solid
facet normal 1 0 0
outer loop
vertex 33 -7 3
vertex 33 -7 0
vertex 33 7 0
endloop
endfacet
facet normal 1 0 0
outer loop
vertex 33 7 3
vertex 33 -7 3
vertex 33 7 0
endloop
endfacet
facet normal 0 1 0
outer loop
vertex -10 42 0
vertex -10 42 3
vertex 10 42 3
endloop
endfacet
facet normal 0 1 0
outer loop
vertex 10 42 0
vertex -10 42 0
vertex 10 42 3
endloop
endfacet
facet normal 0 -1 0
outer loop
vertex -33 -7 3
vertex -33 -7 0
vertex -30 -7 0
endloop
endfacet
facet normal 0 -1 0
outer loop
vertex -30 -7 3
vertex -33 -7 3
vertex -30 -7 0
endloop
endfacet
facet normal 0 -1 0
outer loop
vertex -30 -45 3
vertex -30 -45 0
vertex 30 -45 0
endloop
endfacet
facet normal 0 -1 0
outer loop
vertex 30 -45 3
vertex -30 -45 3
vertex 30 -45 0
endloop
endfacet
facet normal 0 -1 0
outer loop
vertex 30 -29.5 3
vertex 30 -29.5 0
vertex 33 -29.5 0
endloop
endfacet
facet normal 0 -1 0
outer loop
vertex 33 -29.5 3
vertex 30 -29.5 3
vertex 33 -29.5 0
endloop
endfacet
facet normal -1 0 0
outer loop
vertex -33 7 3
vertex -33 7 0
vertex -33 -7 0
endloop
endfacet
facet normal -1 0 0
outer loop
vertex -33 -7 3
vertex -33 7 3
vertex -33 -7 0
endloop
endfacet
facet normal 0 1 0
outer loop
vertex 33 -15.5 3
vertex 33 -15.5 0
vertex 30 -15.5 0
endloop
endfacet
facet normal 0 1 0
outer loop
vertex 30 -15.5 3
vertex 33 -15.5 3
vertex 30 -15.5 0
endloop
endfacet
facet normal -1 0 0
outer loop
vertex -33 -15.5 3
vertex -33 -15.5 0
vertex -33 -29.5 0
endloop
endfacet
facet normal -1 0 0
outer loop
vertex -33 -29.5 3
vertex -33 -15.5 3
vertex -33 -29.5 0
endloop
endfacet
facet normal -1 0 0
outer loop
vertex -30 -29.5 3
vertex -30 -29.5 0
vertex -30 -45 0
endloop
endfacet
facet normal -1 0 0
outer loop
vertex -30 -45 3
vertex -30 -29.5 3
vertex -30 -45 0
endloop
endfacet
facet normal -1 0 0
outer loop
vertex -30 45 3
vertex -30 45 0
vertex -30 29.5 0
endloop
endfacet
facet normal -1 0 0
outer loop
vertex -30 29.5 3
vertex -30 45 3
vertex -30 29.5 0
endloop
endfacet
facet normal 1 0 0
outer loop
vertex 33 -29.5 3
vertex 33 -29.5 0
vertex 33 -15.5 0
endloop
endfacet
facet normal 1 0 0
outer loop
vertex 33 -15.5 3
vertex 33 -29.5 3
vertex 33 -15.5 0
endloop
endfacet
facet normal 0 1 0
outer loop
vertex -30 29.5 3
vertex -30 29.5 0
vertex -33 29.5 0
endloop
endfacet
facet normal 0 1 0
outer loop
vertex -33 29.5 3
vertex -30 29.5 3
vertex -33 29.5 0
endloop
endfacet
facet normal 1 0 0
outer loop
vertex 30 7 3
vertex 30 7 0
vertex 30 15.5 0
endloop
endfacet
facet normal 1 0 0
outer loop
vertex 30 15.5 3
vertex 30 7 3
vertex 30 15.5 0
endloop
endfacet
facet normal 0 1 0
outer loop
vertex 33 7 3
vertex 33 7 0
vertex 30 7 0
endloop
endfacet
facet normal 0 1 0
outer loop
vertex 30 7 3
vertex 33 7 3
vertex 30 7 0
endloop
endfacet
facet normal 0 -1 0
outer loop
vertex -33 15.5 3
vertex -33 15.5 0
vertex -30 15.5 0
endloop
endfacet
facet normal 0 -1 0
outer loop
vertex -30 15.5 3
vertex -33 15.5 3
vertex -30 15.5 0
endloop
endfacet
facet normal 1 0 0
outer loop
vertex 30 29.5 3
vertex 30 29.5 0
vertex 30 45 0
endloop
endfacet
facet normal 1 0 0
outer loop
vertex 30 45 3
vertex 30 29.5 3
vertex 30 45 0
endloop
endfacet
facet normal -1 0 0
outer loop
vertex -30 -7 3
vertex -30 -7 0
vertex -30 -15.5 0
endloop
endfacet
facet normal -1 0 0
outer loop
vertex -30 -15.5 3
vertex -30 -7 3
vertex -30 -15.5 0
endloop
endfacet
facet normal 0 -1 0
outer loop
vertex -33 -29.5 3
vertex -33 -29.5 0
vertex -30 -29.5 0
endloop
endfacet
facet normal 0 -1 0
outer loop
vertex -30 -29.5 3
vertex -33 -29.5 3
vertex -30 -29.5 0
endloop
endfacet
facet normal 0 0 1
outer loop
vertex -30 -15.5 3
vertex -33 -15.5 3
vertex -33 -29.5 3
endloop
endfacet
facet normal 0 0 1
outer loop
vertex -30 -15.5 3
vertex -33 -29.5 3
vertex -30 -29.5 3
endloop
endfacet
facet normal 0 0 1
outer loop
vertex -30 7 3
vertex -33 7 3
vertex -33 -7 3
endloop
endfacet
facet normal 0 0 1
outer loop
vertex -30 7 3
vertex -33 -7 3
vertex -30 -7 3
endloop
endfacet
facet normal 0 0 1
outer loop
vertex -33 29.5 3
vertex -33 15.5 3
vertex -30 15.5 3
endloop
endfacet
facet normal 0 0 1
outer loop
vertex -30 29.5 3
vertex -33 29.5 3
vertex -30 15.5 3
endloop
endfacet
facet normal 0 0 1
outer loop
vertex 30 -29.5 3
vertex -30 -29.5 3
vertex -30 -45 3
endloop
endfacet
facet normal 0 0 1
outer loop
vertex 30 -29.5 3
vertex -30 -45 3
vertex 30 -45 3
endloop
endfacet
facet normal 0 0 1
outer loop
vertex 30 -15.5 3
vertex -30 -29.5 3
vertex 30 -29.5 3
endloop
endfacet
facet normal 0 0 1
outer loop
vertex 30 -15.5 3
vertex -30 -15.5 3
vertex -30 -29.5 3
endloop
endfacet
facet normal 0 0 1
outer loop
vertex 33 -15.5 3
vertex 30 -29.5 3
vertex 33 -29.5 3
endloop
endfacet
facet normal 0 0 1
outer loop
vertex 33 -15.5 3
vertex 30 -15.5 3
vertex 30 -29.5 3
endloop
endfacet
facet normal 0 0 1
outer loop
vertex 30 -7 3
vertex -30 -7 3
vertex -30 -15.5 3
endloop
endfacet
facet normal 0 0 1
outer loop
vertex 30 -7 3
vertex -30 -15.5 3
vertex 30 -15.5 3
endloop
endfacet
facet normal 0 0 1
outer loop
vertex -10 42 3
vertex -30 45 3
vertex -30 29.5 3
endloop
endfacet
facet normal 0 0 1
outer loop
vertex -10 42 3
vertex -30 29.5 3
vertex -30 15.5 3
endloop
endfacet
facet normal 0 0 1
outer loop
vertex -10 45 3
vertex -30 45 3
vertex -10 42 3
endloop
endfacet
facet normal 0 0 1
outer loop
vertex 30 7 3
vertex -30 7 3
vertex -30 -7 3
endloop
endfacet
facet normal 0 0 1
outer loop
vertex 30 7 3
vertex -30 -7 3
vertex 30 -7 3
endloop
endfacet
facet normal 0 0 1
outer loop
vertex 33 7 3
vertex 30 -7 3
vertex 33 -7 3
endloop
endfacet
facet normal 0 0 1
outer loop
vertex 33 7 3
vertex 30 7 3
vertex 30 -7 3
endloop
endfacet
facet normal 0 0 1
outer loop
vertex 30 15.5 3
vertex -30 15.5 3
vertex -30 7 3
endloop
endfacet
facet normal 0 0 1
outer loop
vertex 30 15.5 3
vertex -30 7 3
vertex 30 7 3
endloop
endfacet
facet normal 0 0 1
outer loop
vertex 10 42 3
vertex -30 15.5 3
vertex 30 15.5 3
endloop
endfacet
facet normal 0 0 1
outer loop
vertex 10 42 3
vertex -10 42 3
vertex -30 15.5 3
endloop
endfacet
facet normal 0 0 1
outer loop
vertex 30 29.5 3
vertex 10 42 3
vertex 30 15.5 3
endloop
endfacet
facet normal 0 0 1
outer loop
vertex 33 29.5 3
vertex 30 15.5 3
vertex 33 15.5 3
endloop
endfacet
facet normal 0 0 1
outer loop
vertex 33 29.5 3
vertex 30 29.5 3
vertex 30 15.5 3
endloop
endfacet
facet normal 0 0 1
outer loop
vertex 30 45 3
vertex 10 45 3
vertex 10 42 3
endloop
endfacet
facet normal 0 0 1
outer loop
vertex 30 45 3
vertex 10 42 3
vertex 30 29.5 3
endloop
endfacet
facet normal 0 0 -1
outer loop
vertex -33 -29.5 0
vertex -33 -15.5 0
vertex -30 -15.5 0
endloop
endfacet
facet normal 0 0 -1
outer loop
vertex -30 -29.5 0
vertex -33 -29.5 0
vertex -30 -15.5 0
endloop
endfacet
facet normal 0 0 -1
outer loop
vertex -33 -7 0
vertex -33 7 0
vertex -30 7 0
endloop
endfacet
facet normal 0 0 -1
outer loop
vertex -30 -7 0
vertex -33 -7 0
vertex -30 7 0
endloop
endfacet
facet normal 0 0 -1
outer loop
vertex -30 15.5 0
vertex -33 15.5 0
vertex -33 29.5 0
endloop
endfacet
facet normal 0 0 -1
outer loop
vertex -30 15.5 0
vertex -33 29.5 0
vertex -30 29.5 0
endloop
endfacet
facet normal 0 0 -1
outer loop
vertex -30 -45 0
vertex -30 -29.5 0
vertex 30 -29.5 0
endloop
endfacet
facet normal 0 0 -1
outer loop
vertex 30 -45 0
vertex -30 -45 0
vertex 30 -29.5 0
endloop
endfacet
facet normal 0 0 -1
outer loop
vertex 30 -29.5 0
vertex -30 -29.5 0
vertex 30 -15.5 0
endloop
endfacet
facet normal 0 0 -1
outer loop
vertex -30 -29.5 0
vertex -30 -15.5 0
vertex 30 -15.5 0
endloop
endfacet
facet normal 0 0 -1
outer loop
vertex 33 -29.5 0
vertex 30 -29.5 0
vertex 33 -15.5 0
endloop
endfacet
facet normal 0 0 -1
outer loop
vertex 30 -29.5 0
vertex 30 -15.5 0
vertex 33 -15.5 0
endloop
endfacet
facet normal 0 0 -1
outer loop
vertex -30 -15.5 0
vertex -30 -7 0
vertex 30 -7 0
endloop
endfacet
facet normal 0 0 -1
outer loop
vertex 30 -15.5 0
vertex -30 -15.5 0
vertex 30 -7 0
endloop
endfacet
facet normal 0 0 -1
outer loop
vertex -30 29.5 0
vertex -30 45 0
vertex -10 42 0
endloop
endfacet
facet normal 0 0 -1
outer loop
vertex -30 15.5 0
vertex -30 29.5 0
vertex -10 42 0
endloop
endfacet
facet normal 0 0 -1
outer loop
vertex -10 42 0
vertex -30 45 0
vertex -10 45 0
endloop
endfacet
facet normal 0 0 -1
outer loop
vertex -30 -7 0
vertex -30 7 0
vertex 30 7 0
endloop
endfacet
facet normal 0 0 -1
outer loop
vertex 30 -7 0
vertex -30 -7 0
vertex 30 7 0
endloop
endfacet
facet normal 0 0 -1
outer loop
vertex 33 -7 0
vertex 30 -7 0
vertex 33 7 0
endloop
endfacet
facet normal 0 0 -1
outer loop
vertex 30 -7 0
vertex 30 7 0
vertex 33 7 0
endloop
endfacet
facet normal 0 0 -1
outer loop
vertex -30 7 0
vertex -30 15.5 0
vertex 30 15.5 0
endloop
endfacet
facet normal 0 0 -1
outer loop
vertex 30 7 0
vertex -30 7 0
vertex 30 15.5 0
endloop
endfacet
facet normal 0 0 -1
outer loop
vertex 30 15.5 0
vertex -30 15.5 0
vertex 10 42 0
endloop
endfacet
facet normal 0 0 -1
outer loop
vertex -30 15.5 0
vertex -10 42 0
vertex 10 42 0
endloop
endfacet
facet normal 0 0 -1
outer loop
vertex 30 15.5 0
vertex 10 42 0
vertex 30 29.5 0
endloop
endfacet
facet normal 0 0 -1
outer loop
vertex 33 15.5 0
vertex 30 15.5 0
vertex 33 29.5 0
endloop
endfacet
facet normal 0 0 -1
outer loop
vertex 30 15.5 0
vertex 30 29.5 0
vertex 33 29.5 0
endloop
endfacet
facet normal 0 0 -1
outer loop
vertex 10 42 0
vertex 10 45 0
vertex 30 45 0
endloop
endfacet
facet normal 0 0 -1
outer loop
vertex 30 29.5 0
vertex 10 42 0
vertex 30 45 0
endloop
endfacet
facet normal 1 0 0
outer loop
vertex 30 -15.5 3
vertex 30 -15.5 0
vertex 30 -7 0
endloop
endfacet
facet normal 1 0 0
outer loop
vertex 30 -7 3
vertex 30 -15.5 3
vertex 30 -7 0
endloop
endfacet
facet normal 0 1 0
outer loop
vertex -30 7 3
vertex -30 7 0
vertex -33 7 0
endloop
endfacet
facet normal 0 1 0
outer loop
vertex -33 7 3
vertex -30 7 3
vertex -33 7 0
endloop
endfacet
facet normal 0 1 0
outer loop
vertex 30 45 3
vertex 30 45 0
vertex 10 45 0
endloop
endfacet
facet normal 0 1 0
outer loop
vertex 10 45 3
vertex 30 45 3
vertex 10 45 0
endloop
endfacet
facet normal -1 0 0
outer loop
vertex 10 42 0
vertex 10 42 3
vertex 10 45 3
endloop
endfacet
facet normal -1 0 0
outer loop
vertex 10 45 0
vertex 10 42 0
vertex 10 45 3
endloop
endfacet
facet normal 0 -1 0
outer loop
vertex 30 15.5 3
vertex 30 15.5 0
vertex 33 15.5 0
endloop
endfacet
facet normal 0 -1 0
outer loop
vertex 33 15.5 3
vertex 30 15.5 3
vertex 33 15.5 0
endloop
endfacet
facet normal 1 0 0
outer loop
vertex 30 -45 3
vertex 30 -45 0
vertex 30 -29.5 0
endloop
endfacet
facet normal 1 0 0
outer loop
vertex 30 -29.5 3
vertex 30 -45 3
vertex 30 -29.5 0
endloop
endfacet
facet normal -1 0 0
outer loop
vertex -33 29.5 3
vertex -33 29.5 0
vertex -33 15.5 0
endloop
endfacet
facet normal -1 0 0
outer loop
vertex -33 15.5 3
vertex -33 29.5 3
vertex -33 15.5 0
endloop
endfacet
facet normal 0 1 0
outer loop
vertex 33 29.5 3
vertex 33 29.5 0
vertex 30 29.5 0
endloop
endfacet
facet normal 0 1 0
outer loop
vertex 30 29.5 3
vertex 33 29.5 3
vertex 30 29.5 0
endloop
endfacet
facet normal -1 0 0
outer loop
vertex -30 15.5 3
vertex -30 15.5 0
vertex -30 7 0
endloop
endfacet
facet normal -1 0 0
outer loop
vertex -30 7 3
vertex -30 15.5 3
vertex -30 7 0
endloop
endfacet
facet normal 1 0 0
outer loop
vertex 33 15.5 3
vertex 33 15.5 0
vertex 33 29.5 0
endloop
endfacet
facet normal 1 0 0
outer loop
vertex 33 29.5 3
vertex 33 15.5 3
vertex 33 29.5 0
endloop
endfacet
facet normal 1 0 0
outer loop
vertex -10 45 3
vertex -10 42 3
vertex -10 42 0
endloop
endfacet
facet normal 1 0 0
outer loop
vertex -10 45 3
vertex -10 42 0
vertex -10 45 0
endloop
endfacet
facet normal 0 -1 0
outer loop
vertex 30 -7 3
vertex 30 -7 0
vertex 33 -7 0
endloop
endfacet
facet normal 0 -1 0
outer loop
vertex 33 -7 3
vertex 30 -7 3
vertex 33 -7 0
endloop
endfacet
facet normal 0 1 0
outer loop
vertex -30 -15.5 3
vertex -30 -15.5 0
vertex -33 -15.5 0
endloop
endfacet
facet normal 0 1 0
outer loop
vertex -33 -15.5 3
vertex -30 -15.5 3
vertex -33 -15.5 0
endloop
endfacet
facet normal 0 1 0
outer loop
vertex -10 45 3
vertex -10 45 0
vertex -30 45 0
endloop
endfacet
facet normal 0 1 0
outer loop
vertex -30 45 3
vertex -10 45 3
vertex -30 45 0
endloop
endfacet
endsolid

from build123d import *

# Parameters (mm, degrees)
BOSS_EXTRU_1_DEPTH      = 3
ESQUISSE2_W             = 20
ESQUISSE2_H             = 6
ENL_V_MAT_EXTRU_1_DEPTH = 10


with BuildPart() as part:
    # Esquisse1 → Boss.-Extru.1 (new body)
    with BuildSketch(Plane.XY):
        Polygon((-30, -45), (30, -45), (30, -29.5), (33, -29.5), (33, -15.5), (30, -15.5), (30, -7), (33, -7), (33, 7), (30, 7), (30, 15.5), (33, 15.5), (33, 29.5), (30, 29.5), (30, 45), (-30, 45), (-30, 29.5), (-33, 29.5), (-33, 15.5), (-30, 15.5), (-30, 7), (-33, 7), (-33, -7), (-30, -7), (-30, -15.5), (-33, -15.5), (-33, -29.5), (-30, -29.5), align=None)
    extrude(amount=BOSS_EXTRU_1_DEPTH)

    # Esquisse2 → Enlèv. mat.-Extru.1 (cut)
    with BuildSketch(Plane.XY.offset(3)):
        with Locations((0, 45)):
            Rectangle(ESQUISSE2_W, ESQUISSE2_H)
    extrude(amount=-ENL_V_MAT_EXTRU_1_DEPTH, mode=Mode.SUBTRACT)


solid = part.part
